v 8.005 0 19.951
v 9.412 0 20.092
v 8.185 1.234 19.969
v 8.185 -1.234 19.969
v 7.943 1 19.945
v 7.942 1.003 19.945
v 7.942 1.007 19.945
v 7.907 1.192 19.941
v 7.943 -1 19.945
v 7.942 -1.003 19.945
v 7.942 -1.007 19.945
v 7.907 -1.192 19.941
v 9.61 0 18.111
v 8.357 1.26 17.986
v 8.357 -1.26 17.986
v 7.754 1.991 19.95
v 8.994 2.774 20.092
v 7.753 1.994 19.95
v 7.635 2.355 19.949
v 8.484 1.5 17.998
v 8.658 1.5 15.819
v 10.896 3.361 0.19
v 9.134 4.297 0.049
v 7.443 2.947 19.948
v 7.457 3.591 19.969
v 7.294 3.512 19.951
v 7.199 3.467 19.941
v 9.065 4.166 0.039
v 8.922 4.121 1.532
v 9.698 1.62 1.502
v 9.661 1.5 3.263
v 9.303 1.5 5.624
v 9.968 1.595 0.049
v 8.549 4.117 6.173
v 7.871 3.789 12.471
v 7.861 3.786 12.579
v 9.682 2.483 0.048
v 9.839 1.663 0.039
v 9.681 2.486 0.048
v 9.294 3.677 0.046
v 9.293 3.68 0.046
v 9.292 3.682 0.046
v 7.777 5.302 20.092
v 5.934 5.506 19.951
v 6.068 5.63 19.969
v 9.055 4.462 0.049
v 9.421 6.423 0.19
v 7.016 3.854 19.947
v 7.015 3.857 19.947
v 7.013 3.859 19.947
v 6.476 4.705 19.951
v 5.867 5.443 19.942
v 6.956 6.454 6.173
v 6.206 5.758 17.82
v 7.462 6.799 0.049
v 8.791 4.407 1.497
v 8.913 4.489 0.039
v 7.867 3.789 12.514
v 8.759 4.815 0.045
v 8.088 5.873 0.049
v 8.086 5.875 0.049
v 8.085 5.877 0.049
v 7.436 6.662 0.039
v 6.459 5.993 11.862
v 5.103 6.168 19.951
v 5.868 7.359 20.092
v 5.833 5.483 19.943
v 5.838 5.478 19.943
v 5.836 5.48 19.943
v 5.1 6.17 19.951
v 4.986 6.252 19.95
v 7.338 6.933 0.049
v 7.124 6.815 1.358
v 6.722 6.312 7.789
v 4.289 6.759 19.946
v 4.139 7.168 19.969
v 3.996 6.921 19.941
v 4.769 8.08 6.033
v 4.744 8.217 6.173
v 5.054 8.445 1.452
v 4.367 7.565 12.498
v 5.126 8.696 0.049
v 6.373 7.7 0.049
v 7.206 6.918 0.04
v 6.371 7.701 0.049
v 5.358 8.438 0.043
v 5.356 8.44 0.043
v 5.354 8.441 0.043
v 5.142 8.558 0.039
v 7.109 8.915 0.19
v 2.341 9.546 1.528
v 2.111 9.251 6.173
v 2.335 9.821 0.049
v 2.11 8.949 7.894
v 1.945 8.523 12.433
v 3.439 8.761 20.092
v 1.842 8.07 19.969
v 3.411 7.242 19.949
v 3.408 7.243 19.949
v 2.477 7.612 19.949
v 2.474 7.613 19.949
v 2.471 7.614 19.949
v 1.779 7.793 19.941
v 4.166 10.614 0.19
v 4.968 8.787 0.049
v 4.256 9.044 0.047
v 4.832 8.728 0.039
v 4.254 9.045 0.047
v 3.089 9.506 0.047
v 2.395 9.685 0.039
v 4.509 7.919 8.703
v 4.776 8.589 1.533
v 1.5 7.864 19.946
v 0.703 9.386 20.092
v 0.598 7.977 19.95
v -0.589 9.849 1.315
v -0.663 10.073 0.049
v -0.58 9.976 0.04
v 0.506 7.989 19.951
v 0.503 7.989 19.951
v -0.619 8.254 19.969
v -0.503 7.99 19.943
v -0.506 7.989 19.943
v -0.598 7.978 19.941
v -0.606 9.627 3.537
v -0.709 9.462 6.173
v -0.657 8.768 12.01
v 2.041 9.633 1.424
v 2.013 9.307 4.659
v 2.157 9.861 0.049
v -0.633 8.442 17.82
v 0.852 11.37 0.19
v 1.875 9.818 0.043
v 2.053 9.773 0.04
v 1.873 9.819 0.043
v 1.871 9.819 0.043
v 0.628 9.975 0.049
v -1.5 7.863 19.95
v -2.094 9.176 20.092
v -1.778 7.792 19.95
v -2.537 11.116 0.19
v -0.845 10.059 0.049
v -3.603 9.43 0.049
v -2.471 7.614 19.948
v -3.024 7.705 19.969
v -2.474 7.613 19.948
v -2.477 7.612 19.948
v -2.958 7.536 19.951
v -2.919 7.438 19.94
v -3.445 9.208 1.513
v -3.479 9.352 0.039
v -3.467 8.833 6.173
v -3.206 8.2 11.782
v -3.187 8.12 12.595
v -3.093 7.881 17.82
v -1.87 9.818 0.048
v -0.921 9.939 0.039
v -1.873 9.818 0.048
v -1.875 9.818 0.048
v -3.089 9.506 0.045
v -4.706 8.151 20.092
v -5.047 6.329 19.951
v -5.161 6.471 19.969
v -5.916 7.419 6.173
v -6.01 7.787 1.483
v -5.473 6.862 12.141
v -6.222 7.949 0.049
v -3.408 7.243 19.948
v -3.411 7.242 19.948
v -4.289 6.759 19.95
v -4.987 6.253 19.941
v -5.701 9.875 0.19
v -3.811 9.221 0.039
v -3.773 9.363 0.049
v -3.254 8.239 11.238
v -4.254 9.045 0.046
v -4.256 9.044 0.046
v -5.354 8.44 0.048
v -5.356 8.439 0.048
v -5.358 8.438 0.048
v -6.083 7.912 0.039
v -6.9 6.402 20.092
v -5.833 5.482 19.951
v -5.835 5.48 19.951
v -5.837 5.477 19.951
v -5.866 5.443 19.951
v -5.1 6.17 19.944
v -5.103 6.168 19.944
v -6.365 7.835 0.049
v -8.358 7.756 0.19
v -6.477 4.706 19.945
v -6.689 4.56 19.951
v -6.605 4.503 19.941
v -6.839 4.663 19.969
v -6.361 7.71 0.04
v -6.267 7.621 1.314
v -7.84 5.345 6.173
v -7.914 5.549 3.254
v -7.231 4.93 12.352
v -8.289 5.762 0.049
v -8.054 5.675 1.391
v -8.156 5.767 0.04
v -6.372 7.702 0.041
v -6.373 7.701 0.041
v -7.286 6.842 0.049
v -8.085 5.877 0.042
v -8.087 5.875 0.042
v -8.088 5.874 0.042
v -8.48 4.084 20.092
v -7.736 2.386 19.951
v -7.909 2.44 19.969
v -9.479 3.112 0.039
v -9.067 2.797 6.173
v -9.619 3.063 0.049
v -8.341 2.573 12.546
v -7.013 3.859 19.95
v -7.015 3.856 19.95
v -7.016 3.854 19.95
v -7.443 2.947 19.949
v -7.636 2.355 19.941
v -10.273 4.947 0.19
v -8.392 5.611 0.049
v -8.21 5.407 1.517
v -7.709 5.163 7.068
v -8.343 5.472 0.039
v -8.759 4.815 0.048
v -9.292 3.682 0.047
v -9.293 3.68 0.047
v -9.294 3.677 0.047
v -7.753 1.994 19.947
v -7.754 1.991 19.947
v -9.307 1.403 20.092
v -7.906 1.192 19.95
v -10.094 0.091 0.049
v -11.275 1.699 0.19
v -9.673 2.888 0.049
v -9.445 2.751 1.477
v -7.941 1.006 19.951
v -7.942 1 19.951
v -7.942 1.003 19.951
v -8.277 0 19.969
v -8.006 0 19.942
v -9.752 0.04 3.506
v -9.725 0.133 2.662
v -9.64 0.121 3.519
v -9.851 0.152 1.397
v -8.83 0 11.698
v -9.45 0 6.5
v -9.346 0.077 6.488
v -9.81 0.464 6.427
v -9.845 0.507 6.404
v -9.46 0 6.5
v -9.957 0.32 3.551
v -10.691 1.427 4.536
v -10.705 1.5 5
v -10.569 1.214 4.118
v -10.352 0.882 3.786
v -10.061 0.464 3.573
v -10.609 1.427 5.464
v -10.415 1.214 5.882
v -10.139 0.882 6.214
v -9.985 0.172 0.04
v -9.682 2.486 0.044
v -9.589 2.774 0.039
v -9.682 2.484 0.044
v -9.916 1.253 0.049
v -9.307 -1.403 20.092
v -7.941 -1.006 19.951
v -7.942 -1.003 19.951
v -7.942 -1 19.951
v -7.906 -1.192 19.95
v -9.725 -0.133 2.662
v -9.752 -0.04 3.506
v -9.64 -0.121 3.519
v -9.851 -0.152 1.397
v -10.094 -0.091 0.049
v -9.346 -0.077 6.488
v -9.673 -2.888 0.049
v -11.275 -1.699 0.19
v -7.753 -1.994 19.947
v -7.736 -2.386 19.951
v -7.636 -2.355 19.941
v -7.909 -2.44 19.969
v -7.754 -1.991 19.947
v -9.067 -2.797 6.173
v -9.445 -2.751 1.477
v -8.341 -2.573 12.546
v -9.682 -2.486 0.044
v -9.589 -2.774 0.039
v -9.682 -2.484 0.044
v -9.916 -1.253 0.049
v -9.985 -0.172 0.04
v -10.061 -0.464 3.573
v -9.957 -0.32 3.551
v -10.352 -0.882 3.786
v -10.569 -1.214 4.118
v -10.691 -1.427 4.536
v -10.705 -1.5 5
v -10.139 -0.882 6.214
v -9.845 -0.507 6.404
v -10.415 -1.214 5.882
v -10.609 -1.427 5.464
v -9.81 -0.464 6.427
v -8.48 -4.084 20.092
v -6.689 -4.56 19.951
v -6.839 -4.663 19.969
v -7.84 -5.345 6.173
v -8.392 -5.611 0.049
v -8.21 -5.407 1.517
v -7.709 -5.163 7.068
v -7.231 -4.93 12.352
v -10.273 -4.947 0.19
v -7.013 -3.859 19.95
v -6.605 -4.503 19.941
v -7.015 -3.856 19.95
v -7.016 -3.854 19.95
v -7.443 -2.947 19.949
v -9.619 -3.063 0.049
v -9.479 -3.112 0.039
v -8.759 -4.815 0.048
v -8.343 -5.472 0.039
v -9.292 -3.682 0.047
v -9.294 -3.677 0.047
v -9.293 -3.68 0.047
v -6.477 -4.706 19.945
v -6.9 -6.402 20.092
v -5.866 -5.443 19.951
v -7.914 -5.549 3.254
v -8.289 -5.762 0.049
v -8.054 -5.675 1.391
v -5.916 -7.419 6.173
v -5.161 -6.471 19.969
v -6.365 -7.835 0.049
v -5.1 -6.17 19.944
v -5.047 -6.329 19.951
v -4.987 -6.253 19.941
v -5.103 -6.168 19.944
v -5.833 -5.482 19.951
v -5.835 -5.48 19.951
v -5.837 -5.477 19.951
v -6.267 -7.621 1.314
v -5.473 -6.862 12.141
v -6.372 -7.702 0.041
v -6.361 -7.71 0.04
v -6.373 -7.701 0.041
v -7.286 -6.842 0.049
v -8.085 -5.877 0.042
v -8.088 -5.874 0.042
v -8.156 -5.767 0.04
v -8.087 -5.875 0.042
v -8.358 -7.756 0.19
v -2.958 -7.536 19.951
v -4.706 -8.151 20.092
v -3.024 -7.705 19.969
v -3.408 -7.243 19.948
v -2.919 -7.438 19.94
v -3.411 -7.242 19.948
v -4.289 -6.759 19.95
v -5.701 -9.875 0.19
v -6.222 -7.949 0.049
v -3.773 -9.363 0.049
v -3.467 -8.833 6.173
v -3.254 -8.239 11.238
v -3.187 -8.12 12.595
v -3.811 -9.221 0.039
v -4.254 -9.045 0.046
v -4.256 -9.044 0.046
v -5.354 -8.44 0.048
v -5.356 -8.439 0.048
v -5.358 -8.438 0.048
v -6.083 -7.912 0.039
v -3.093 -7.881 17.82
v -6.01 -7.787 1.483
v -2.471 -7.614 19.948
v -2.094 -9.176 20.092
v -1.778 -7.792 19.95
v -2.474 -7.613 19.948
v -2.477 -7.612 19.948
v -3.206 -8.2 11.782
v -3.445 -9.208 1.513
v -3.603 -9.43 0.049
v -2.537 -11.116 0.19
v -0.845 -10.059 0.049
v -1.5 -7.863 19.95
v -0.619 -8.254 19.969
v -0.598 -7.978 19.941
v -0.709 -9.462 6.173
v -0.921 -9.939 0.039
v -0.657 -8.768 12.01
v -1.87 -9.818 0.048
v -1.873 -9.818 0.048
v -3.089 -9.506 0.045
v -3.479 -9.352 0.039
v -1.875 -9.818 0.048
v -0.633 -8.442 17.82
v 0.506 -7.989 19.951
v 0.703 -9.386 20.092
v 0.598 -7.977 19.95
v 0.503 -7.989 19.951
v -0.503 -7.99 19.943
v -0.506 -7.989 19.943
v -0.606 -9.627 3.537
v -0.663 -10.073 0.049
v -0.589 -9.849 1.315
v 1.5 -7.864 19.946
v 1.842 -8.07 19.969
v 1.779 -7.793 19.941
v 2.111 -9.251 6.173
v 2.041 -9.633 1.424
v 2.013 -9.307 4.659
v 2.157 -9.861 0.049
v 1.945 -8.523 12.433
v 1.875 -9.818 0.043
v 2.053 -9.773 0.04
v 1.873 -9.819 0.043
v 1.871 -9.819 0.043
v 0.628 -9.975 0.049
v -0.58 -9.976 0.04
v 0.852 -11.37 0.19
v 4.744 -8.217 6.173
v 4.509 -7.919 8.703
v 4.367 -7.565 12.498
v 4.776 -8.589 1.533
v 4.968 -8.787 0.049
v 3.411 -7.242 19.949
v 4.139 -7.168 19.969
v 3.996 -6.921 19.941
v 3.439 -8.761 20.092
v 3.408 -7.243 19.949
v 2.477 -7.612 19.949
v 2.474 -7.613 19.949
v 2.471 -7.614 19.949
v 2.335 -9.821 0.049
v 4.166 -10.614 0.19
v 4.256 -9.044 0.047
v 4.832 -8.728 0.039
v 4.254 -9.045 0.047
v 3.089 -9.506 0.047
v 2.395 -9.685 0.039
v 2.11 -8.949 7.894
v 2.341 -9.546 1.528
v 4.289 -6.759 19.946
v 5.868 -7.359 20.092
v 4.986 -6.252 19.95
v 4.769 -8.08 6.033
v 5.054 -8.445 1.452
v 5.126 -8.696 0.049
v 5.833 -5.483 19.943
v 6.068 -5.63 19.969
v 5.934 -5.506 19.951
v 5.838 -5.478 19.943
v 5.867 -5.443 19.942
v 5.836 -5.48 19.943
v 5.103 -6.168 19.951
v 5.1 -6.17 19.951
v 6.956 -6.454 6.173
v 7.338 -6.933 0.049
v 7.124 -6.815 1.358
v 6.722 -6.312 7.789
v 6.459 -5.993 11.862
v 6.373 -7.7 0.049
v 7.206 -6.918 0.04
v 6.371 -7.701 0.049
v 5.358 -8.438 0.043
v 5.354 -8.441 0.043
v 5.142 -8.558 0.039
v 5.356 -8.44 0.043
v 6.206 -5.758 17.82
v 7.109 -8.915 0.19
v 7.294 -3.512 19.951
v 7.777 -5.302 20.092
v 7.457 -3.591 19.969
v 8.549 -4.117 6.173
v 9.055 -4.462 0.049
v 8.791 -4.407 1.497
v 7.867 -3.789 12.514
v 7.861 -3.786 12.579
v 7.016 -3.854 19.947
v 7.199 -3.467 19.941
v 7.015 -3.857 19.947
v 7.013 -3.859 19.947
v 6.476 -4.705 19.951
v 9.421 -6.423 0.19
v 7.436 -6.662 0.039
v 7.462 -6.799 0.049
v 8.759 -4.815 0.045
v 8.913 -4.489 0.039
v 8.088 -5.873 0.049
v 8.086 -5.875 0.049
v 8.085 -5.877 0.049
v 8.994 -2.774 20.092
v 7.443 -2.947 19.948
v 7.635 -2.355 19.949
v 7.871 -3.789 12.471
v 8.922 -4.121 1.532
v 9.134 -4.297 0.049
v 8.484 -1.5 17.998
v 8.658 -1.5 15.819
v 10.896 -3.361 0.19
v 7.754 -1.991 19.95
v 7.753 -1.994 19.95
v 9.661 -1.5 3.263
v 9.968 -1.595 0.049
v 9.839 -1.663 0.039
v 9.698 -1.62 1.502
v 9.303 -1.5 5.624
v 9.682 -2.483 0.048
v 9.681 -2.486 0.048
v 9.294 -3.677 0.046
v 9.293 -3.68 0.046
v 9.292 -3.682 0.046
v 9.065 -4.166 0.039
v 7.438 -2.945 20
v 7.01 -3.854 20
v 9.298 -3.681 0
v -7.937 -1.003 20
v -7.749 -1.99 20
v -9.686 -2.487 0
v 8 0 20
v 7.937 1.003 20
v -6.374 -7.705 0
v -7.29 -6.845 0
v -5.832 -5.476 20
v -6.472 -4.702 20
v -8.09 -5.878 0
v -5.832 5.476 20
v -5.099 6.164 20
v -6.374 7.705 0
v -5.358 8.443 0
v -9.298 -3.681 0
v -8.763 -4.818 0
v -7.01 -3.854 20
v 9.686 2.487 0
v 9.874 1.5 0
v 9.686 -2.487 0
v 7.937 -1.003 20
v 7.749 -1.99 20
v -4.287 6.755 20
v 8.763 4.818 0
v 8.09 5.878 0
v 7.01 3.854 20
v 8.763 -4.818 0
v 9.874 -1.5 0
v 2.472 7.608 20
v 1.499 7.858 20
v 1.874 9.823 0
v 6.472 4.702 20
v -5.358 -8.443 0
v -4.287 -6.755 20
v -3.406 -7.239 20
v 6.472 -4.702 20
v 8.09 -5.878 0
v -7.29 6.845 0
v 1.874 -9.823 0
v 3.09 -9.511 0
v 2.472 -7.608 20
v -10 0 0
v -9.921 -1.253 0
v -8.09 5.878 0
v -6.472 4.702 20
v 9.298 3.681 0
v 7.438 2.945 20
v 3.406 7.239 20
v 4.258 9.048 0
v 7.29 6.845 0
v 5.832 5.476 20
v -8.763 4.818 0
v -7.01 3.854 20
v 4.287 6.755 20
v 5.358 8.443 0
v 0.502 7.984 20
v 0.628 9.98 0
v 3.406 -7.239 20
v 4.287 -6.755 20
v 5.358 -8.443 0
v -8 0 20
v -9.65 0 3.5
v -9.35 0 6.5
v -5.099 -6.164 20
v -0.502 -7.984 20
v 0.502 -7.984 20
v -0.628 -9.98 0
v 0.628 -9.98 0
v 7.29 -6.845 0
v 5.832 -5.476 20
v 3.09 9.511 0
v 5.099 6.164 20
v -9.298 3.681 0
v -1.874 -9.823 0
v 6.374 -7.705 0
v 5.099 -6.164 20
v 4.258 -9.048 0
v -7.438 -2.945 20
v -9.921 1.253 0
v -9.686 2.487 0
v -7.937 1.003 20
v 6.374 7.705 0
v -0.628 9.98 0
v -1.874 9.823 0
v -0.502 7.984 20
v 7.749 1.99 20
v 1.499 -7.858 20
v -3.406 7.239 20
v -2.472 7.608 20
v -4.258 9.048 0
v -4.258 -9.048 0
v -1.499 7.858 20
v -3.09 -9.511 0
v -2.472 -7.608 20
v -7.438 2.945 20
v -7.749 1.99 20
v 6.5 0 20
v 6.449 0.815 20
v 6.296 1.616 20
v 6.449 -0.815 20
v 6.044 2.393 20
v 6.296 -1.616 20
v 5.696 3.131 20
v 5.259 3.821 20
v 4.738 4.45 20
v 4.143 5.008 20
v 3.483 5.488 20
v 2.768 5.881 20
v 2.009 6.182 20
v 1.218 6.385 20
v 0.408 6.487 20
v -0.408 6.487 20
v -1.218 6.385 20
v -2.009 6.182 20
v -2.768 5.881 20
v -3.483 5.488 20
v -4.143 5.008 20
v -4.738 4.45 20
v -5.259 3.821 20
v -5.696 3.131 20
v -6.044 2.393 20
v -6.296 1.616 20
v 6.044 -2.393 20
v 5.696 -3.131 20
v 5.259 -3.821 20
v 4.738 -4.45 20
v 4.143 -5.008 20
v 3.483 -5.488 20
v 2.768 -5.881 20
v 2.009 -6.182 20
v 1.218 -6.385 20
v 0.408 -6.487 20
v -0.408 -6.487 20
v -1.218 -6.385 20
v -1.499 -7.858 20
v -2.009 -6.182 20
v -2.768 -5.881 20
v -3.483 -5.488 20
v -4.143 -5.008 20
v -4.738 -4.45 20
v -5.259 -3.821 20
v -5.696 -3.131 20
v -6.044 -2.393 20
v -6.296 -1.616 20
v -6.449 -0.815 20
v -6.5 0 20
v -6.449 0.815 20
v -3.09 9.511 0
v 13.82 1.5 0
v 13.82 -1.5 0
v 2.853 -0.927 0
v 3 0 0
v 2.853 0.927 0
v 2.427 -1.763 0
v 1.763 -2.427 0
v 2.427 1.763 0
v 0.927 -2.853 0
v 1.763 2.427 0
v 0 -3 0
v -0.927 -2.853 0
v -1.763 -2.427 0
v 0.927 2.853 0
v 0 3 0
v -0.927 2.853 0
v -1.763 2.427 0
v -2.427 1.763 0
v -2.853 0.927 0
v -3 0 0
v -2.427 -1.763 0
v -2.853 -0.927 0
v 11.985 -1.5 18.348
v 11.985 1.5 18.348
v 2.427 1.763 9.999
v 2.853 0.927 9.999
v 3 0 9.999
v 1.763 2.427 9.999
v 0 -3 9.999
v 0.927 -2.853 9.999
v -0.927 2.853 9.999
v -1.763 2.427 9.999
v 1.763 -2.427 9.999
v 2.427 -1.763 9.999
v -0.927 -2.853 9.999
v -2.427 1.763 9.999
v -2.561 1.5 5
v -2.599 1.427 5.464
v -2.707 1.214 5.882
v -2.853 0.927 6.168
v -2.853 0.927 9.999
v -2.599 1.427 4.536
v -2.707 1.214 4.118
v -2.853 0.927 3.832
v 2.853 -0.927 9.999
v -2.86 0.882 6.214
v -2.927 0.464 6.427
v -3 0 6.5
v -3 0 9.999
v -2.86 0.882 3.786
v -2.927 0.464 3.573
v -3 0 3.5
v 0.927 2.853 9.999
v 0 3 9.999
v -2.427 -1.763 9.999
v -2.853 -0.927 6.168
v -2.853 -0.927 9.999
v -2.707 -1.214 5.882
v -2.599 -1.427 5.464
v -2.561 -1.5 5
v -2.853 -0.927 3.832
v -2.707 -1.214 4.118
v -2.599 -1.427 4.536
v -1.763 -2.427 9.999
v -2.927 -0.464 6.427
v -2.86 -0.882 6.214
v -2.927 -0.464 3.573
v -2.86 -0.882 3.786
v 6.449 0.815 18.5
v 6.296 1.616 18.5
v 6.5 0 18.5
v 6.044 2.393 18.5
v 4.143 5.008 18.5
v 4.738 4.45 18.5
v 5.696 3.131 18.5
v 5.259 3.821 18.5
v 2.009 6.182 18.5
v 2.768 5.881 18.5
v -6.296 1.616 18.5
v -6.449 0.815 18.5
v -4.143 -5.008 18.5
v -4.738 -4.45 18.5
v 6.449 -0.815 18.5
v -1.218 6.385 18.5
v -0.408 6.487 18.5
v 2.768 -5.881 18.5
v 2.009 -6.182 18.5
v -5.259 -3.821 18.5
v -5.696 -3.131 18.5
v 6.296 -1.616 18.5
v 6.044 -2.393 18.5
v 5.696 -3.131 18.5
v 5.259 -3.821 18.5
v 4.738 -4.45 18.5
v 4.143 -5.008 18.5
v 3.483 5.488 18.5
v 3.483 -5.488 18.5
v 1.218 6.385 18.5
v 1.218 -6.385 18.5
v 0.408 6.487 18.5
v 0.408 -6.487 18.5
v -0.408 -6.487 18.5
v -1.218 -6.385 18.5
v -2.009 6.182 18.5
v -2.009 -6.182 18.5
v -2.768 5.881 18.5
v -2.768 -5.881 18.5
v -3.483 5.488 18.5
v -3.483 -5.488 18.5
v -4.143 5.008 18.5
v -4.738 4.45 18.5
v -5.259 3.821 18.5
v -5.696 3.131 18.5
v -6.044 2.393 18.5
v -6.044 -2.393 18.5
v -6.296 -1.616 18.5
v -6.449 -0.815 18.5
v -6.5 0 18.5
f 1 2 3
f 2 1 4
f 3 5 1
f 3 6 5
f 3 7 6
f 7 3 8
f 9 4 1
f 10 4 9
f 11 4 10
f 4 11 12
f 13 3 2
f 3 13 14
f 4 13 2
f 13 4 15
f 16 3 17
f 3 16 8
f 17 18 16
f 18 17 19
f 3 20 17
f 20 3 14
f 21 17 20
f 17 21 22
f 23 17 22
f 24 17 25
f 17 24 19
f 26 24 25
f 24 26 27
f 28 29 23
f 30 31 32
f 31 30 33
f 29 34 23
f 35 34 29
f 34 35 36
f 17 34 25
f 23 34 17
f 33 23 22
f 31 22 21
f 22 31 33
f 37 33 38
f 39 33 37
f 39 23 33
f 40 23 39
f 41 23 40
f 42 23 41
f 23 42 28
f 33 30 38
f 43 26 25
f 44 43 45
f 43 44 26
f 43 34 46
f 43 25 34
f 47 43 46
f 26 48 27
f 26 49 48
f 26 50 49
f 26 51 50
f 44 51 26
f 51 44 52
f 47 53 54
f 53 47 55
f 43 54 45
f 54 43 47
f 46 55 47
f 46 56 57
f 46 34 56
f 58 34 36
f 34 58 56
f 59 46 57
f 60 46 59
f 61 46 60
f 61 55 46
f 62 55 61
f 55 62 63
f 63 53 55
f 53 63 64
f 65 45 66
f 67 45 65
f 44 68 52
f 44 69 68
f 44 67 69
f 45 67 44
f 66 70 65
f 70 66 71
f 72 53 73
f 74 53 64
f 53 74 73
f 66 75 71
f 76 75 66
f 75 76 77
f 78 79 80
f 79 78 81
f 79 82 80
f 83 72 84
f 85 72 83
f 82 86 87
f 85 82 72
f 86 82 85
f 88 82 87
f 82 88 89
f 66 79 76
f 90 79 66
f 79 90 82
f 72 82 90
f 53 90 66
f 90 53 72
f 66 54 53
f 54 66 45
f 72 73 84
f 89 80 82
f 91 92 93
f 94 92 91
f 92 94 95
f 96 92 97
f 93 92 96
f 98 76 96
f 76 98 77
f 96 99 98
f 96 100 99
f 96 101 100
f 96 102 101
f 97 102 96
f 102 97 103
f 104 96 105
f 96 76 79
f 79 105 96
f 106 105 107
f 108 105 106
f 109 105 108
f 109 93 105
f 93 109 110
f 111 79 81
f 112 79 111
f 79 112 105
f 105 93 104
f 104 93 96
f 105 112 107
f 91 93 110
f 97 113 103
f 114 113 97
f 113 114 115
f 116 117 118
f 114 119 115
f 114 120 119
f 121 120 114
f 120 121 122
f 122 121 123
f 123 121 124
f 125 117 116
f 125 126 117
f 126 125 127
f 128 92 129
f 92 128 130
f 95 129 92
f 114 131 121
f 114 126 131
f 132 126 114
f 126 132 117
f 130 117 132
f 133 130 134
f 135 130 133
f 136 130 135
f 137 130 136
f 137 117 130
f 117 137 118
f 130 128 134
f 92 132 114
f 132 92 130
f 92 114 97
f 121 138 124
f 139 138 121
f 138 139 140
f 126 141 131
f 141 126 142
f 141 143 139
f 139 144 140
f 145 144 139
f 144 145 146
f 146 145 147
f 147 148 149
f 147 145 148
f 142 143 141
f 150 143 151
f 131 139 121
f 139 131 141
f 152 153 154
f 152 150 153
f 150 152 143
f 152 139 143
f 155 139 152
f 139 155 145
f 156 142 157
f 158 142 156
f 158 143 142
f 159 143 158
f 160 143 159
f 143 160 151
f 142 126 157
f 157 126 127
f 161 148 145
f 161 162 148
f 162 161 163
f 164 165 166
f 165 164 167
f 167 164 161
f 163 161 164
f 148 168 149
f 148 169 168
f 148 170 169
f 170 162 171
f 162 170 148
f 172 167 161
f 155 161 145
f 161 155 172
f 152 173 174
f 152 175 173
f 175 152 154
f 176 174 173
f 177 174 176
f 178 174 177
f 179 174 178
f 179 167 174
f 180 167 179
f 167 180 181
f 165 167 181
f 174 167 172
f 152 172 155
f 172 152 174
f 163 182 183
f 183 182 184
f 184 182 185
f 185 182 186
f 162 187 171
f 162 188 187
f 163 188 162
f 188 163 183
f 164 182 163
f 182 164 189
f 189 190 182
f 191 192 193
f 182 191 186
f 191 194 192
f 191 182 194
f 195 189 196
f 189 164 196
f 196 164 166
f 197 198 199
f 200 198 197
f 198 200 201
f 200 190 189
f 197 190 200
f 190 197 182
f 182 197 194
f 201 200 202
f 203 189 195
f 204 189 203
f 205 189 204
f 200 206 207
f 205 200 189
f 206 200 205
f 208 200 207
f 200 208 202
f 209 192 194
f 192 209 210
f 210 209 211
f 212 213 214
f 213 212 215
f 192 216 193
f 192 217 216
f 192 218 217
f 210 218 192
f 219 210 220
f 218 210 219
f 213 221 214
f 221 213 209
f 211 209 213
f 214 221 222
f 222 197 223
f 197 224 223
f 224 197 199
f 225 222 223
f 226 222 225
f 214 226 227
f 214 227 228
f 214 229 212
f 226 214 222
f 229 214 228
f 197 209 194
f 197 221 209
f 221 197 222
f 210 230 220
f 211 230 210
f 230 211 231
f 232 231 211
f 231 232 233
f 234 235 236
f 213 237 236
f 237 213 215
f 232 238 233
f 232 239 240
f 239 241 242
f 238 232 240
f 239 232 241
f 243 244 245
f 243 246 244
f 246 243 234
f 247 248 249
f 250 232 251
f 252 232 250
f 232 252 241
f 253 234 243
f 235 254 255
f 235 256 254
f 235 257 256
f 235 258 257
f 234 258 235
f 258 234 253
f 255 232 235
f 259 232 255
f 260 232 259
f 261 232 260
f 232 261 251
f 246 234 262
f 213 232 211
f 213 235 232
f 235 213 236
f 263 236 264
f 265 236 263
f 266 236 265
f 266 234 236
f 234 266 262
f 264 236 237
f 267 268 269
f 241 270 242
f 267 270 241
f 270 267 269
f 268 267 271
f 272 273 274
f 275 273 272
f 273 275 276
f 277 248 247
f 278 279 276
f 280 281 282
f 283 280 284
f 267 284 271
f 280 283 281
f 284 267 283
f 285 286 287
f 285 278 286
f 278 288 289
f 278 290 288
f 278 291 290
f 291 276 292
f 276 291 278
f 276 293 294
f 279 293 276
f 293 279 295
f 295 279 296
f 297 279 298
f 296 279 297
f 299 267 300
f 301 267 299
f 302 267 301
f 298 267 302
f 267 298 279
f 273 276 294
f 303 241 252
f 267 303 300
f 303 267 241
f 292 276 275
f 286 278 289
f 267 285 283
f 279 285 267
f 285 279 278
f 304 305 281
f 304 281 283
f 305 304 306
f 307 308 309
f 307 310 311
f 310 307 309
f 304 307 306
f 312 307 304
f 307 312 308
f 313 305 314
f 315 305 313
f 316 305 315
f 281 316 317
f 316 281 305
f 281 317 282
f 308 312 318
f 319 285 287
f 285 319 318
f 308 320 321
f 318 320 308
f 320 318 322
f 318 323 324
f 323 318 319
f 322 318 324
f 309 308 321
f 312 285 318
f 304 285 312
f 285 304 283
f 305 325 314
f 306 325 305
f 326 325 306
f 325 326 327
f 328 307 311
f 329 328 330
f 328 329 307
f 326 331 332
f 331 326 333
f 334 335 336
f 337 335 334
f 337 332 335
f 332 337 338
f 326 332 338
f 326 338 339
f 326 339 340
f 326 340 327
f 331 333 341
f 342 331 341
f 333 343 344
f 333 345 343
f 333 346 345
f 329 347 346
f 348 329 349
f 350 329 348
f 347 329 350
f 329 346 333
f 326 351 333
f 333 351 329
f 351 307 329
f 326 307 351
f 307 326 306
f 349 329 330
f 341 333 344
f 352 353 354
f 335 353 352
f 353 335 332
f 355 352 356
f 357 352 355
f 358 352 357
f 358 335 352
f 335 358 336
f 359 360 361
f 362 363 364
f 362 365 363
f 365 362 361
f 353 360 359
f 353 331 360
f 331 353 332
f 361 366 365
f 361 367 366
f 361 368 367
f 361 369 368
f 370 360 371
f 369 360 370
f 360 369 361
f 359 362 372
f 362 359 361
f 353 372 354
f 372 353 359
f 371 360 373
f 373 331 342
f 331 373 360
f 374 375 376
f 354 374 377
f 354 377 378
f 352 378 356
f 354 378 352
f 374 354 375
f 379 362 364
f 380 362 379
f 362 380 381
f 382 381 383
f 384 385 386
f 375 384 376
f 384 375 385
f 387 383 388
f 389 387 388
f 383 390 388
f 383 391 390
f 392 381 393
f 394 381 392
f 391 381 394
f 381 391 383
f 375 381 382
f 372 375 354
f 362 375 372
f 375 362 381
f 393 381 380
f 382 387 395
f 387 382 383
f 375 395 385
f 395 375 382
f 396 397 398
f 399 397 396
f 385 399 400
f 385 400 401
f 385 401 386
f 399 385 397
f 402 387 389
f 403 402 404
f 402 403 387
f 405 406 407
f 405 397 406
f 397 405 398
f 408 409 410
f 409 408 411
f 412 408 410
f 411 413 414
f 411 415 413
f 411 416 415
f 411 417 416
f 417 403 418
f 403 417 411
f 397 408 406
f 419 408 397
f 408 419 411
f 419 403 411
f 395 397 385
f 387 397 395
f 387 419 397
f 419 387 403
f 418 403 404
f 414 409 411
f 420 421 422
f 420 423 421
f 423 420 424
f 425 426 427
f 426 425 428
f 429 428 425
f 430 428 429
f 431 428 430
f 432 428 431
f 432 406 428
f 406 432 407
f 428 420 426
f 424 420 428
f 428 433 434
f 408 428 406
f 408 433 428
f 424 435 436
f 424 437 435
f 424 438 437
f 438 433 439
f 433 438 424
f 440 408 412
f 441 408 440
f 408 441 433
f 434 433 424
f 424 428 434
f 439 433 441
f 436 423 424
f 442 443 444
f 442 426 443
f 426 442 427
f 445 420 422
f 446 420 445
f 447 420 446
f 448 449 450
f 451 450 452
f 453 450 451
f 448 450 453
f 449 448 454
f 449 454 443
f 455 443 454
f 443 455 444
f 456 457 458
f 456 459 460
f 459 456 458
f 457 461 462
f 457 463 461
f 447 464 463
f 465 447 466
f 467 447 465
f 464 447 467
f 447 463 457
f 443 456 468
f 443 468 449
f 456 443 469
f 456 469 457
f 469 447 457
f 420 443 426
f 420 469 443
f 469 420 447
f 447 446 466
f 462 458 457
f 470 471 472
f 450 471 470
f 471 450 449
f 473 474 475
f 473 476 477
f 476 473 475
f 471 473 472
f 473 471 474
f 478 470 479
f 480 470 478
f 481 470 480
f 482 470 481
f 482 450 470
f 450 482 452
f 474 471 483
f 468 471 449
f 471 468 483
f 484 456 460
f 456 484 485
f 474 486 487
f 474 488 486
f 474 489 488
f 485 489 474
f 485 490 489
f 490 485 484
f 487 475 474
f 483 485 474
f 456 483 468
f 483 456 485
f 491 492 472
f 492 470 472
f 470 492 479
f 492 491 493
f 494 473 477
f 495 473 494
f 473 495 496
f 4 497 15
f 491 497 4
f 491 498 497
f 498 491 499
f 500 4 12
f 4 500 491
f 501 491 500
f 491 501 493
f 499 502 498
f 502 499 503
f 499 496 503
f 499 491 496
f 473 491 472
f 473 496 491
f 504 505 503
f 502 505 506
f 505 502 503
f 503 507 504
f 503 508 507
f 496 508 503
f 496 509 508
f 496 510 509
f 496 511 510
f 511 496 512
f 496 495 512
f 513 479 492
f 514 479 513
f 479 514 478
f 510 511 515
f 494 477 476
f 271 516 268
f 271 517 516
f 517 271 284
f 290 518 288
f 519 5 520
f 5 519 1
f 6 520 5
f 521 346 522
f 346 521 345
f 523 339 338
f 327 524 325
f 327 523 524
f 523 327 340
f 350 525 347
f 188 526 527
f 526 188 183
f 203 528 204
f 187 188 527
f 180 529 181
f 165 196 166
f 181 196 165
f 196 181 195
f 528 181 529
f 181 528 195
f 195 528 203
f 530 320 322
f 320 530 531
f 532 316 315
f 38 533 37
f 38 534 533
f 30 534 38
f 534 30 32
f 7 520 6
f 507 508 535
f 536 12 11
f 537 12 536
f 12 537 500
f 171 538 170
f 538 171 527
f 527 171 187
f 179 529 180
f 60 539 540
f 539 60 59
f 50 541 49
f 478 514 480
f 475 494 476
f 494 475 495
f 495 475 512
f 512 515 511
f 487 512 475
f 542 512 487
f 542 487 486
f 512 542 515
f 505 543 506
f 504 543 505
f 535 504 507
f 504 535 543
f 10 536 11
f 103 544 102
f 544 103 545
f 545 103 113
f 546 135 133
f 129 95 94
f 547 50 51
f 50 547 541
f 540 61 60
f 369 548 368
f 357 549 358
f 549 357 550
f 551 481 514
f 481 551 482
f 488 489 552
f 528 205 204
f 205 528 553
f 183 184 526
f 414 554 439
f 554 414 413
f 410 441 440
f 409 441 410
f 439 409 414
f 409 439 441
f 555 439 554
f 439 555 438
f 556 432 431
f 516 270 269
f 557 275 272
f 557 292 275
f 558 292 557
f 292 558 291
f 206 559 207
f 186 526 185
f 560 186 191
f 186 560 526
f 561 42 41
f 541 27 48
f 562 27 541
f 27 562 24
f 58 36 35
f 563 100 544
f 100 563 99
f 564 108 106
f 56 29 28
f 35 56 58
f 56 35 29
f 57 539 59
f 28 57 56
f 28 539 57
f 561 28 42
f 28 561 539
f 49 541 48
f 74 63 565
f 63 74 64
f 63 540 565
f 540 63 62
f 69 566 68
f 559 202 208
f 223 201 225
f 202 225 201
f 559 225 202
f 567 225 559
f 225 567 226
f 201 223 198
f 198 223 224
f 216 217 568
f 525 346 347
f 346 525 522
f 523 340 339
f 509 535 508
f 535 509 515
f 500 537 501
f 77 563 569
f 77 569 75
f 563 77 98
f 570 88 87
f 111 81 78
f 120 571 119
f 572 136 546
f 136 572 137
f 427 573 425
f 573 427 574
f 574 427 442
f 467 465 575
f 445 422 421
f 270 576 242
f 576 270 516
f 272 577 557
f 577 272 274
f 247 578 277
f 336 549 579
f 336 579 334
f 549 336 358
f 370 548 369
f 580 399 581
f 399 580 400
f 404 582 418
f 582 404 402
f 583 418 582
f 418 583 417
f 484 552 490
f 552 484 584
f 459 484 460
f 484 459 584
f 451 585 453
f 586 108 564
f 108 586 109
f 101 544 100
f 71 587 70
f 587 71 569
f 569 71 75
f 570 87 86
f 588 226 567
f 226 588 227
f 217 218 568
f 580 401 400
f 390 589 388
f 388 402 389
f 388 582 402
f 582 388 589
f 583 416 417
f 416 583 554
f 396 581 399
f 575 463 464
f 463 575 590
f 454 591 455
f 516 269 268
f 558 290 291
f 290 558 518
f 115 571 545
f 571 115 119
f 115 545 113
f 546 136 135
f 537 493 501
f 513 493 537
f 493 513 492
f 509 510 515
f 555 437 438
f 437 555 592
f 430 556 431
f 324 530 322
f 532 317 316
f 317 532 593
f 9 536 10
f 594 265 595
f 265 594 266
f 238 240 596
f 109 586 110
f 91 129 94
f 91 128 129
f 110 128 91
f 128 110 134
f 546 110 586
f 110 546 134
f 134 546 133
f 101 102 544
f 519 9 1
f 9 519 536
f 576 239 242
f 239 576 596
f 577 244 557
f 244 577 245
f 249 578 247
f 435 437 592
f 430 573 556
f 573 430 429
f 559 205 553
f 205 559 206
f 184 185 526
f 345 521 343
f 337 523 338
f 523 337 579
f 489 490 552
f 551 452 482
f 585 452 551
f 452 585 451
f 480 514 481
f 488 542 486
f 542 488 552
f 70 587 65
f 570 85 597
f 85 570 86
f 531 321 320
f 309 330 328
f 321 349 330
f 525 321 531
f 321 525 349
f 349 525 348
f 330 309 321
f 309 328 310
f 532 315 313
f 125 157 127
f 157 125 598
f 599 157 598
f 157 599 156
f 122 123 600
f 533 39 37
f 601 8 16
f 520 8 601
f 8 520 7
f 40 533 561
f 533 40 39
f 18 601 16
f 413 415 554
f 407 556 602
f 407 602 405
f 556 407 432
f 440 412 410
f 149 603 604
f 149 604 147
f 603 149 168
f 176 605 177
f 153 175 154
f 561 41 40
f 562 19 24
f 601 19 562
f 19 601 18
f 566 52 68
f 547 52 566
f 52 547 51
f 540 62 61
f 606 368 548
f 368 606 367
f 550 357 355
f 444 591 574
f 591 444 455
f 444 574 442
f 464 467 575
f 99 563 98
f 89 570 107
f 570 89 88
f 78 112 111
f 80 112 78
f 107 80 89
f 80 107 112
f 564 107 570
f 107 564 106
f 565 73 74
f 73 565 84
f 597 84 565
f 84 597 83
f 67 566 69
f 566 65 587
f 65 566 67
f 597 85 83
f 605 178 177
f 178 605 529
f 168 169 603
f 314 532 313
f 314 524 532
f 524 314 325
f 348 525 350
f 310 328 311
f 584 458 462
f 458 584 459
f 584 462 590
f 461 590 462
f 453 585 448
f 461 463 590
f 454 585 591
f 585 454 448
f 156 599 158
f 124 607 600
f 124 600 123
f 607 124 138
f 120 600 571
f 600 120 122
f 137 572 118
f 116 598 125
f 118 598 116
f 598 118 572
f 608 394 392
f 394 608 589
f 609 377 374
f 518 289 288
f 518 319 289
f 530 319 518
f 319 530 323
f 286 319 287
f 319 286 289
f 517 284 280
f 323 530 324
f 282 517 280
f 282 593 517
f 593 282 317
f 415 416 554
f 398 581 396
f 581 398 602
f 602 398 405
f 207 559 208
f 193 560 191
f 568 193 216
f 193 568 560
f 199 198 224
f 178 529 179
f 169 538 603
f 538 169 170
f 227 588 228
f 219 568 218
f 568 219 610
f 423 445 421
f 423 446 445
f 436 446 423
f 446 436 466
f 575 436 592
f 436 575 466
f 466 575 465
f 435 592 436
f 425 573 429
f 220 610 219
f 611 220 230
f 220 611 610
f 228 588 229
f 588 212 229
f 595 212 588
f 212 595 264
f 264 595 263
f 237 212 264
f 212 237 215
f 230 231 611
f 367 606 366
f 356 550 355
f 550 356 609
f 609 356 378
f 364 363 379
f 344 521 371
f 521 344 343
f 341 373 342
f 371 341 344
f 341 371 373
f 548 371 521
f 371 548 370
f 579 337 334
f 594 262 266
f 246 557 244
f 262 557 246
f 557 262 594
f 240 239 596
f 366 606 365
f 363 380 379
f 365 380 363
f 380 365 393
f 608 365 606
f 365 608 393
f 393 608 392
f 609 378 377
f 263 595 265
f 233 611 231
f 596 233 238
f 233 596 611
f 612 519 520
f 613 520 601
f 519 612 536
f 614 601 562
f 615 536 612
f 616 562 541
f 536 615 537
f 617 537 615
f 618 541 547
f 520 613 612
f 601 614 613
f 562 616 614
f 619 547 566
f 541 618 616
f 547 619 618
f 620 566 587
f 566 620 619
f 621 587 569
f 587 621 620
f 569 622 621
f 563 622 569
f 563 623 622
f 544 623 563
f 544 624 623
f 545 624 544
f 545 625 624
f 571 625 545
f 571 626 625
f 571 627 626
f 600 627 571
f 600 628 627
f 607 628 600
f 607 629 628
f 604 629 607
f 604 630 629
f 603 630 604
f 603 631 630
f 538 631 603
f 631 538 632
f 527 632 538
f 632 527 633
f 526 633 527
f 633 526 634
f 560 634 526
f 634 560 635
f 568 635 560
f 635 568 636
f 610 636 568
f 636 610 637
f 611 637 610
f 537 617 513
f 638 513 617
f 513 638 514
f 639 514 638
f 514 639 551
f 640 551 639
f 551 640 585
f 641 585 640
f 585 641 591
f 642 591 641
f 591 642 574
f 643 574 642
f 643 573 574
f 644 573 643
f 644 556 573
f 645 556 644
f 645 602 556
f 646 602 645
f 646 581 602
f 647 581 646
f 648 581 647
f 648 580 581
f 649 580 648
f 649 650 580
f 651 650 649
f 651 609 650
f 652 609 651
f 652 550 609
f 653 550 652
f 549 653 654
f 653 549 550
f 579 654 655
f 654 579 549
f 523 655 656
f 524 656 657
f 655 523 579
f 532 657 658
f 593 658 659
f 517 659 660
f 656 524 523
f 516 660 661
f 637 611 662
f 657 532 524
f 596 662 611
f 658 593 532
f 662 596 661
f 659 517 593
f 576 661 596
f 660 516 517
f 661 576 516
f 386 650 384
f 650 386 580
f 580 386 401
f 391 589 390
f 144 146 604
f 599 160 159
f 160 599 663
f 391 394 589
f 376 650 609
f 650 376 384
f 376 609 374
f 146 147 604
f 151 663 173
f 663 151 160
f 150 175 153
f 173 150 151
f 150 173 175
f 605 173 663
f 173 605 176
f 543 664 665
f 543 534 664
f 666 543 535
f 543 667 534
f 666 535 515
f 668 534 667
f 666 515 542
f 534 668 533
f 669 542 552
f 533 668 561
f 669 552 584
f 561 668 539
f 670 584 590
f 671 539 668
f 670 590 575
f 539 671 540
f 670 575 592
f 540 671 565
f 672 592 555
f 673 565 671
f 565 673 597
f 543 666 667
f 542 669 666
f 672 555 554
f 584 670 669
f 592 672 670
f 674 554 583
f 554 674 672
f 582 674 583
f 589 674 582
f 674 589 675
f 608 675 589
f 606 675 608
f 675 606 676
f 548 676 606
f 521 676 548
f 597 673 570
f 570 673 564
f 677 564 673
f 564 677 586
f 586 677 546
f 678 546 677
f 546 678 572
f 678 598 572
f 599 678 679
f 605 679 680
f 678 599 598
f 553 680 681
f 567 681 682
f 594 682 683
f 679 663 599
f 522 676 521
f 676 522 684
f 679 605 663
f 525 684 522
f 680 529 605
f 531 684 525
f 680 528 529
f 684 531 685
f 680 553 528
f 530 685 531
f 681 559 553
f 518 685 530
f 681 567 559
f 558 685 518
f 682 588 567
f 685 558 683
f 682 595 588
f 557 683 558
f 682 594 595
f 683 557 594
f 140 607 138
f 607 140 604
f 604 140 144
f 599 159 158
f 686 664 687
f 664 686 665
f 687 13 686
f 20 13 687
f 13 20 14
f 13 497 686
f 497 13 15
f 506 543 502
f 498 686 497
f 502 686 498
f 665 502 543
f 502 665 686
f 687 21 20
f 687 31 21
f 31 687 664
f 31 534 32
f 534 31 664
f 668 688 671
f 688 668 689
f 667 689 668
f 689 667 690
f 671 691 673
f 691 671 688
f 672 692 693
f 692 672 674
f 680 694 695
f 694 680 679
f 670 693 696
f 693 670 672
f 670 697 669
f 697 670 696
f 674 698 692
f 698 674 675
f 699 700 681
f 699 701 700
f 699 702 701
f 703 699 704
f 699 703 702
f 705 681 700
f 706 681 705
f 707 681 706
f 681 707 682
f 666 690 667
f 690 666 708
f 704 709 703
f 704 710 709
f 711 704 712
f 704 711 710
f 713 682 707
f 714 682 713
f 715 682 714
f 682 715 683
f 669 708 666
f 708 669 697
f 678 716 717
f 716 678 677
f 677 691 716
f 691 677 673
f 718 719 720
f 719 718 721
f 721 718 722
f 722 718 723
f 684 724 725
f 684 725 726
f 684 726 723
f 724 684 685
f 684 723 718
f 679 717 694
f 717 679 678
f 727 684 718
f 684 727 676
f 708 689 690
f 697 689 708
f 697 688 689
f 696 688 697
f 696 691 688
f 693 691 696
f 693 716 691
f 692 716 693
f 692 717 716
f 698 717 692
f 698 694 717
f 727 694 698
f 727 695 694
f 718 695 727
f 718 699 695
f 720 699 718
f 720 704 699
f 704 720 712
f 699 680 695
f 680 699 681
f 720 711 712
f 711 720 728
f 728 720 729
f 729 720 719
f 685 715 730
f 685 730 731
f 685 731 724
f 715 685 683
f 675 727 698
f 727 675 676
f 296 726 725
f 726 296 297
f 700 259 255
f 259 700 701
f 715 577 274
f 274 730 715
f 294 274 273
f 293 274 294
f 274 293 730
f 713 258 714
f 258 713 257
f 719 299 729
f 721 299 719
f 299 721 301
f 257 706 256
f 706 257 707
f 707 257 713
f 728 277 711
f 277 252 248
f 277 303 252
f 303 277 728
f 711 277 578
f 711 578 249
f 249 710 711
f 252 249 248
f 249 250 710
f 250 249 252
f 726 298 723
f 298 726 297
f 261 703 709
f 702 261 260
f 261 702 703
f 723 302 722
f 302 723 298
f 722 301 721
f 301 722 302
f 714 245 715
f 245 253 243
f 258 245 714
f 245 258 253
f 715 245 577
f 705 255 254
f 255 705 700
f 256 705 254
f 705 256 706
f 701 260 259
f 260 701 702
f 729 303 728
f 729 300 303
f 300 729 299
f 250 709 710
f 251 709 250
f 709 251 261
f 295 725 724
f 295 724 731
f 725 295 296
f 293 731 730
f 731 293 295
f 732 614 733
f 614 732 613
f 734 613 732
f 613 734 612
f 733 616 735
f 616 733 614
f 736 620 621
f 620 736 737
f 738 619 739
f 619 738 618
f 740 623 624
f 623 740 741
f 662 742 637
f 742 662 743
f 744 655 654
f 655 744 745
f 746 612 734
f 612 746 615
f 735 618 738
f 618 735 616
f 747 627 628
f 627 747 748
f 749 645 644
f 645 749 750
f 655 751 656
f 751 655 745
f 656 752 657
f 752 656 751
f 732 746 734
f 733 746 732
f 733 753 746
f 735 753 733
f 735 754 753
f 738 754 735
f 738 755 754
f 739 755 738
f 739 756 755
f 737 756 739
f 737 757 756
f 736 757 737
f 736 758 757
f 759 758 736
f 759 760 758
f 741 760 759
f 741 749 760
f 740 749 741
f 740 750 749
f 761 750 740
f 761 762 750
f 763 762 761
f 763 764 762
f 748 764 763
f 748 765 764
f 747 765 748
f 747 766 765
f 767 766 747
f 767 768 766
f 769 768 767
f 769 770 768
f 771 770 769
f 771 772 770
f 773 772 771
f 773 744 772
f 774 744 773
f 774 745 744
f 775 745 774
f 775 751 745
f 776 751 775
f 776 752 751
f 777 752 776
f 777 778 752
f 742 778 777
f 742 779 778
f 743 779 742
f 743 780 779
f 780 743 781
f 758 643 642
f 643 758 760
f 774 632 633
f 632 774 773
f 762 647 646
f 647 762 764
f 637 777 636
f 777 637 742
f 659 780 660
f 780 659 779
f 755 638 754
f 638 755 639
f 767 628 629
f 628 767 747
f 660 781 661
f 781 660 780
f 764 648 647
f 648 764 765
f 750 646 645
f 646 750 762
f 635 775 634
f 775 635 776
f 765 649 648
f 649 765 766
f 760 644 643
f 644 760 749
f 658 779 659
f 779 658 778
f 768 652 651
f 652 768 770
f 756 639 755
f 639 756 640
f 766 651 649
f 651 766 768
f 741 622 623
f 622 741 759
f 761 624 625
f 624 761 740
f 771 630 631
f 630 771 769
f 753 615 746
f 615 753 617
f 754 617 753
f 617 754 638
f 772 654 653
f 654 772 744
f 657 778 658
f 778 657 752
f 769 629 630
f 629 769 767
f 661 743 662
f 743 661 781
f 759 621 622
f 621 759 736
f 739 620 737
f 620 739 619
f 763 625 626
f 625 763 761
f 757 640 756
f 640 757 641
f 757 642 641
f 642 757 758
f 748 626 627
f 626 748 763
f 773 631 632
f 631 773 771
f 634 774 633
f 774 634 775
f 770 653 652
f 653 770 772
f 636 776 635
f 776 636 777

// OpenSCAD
//////////////////////////
// Customizable settings
//////////////////////////


// Diameter of the hole on the bottom (in mm).
HoleDiameter = 6;

// Depth of the hole in the bottom (in mm).  If you want the hole to go all the way through then set this to a number larger than the total height of the object.
HoleDepth = 10;

// If you want a D-shaped hole, set this to the thickness of the flat side (in mm).  Larger values for the flat make the hole smaller.
HoleFlatThickness = 0;

// Height (in mm).  If dome cap is selected, it is not included in height.  The shaft length is also not counted.
KnobHeight = 20;

// Diameter of base of round part of knob (in mm).  (Knurled ridges are not included in this measurement.)
KnobDiameter = 20;

// Shape of top of knob.  "Recessed" type can be painted.
CapType = 1;	// [0:Flat, 1:Recessed, 2:Dome]

// Do you want a large timer-knob style pointer?
TimerKnob=0;	// [0:No, 1:Yes]

// Would you like a divot on the top to indicate direction?
Pointer1 = 0;	// [0:No, 1:Yes]

// Would you like a line (pointer) on the front to indicate direction?
Pointer2 = 1;	// [0:No, 1:Yes]

// Do you want finger ridges around the knob?
Knurled = 1;	// [0:No, 1:Yes]

// 0 = A cylindrical knob, any other value will taper the knob.
TaperPercentage = 20;		// [0:0%, 10:10%, 20:20%, 30:30%, 40:40%, 50:50%]

// Width of "dial" ring (in mm).  Set to zero if you don't want the ring.
RingWidth = 0;

// The number of markings on the dial.  Set to zero if you don't want markings.  (RingWidth must be non-zero.)
RingMarkings = 10;

// diameter of the hole for the setscrew (in mm).  If you don't need a hole, set this to zero.
ScrewHoleDiameter = 3;

// Length of the shaft on the bottom of the knob (in mm).  If you don't want a shaft, set this value to zero.
ShaftLength = 0;

// Diameter of the shaft on the bottom of the knob (in mm).  (ShaftLength must be non-zero.)
ShaftDiameter = 10;

// Would you like a notch in the shaft?  It can be used for a press-on type knob (rather than using a setscrew).  (ShaftLength must be non-zero.)
NotchedShaft = 0;	// [0:No, 1:Yes]



//////////////////////////
//Advanced settings
//////////////////////////

RingThickness = 5*1;
DivotDepth = 1.5*1;
MarkingWidth = 1.5*1;
DistanceBetweenKnurls = 3*1;
TimerKnobConst = 1.8*1;



//////////////////////////
//Calculations
//////////////////////////

PI=3.14159265*1;
KnobMajorRadius = KnobDiameter/2;
KnobMinorRadius = KnobDiameter/2 * (1 - TaperPercentage/100);
KnobRadius = KnobMinorRadius + (KnobMajorRadius-KnobMinorRadius)/2;
KnobCircumference = PI*KnobDiameter;
Knurls = round(KnobCircumference/DistanceBetweenKnurls);
Divot=CapType;

TaperAngle=asin(KnobHeight / (sqrt(pow(KnobHeight, 2) +
		pow(KnobMajorRadius-KnobMinorRadius,2)))) - 90;

DivotRadius = KnobMinorRadius*.4;


union()
{
translate([0, 0, (ShaftLength==0)? 0 : ShaftLength-0.001])
difference()
{
union()
{
	// Primary knob cylinder
	cylinder(h=KnobHeight, r1=KnobMajorRadius, r2=KnobMinorRadius,
			$fn=50);
	
	if (Knurled)
		for (i=[0 : Knurls-1])
			rotate([0, 0, i * (360/Knurls)])
				translate([KnobRadius, 0, KnobHeight/2])
					rotate([0, TaperAngle, 0]) rotate([0, 0, 45])
						cube([2, 2, KnobHeight+.001], center=true);

 	if (RingMarkings>0)
		for (i=[0 : RingMarkings-1])
			rotate([0, 0, i * (360/RingMarkings)])
				translate([KnobMajorRadius + RingWidth/2, 0, 1])
					cube([RingWidth*.5, MarkingWidth, 2], center=true);		
	
	if (Pointer2==1)
		translate([KnobRadius, 0, KnobHeight/2-2])
			rotate([0, TaperAngle, 0])
				cube([8, 3, KnobHeight], center=true);		

	if (RingWidth>0)
		translate([0, 0, RingThickness/2])
			cylinder(r1=KnobMajorRadius + RingWidth, r2=KnobMinorRadius,
					h=RingThickness, $fn=50, center=true);

	if (Divot==2)
		translate([0, 0, KnobHeight])
			difference()
			{
				scale([1, 1, 0.5])
					sphere(r=KnobMinorRadius, $fn=50, center=true);

				translate([0, 0, 0-(KnobMinorRadius+.001)])
					cube([KnobMinorRadius*2.5, KnobMinorRadius*2.5,
							KnobMinorRadius*2], center=true);
			}

	if (TimerKnob==1) intersection()
		{
			translate([0, 0, 0-(KnobDiameter*TimerKnobConst) + KnobHeight])
			sphere(r=KnobDiameter*TimerKnobConst, $fn=50, center=true);		
	
			translate([0-(KnobDiameter*TimerKnobConst)*0.1, 0,
					KnobHeight/2])
				scale([1, 0.5, 1])
					cylinder(h=KnobHeight, r=(KnobDiameter*TimerKnobConst) *
							0.8, $fn=3, center=true);
		}
}

// Pointer1: Offset hemispherical divot
if (Pointer1==1)
	translate([KnobMinorRadius*.55, 0, KnobHeight + DivotRadius*.6])
		sphere(r=DivotRadius, $fn=40);

// Divot1: Centered cylynrical divot
if (Divot==1)
	translate([0, 0, KnobHeight])
		cylinder(h=DivotDepth*2, r=KnobMinorRadius-1.5, $fn=50,
				center=true);

if (ShaftLength==0)
{
	// Hole for shaft
	translate([0, 0, HoleDepth/2 - 0.001])
		difference()
		{
			cylinder(r=HoleDiameter/2, h=HoleDepth, $fn=20,
					center=true);
	
			// Flat for D-shaped hole
			translate([(0-HoleDiameter)+HoleFlatThickness, 0, 0])
				cube([HoleDiameter, HoleDiameter, HoleDepth+.001],
						center=true);
		}
	
	// Hole for setscrew
	if (ScrewHoleDiameter>0)
		translate([0 - (KnobMajorRadius+RingWidth+1)/2, 0,
				HoleDepth/2])
			rotate([0, 90, 0])
			cylinder(h=(KnobMajorRadius+RingWidth+1),
					r=ScrewHoleDiameter/2, $fn=20, center=true);
}

// Make sure bottom ends at z=0
translate([0, 0, -10])
	cube([(KnobMajorRadius+RingWidth) * 3,
			(KnobMajorRadius+RingWidth) * 3, 20], center=true);
}

if (ShaftLength>0)
	difference()
	{
		translate([0, 0, ShaftLength/2])
			cylinder(h=ShaftLength, r=ShaftDiameter/2, $fn=20,
					center=true);

		if (NotchedShaft==1)
		{
			cube([HoleDiameter/2, ShaftDiameter*2, ShaftLength],
					center=true);
		}

		// Hole for shaft
		translate([0, 0, HoleDepth/2 - 0.001])
			difference()
			{
				cylinder(r=HoleDiameter/2, h=HoleDepth, $fn=20,
						center=true);
		
				// Flat for D-shaped hole
				translate([(0-HoleDiameter)+HoleFlatThickness, 0, 0])
					cube([HoleDiameter, HoleDiameter, HoleDepth+.001],
							center=true);
			}
		
		// Hole for setscrew
		if (ScrewHoleDiameter>0)
			translate([0 - (KnobMajorRadius+RingWidth+1)/2, 0,
					HoleDepth/2])
				rotate([0, 90, 0])
				cylinder(h=(KnobMajorRadius+RingWidth+1),
						r=ScrewHoleDiameter/2, $fn=20, center=true);
	}
}
